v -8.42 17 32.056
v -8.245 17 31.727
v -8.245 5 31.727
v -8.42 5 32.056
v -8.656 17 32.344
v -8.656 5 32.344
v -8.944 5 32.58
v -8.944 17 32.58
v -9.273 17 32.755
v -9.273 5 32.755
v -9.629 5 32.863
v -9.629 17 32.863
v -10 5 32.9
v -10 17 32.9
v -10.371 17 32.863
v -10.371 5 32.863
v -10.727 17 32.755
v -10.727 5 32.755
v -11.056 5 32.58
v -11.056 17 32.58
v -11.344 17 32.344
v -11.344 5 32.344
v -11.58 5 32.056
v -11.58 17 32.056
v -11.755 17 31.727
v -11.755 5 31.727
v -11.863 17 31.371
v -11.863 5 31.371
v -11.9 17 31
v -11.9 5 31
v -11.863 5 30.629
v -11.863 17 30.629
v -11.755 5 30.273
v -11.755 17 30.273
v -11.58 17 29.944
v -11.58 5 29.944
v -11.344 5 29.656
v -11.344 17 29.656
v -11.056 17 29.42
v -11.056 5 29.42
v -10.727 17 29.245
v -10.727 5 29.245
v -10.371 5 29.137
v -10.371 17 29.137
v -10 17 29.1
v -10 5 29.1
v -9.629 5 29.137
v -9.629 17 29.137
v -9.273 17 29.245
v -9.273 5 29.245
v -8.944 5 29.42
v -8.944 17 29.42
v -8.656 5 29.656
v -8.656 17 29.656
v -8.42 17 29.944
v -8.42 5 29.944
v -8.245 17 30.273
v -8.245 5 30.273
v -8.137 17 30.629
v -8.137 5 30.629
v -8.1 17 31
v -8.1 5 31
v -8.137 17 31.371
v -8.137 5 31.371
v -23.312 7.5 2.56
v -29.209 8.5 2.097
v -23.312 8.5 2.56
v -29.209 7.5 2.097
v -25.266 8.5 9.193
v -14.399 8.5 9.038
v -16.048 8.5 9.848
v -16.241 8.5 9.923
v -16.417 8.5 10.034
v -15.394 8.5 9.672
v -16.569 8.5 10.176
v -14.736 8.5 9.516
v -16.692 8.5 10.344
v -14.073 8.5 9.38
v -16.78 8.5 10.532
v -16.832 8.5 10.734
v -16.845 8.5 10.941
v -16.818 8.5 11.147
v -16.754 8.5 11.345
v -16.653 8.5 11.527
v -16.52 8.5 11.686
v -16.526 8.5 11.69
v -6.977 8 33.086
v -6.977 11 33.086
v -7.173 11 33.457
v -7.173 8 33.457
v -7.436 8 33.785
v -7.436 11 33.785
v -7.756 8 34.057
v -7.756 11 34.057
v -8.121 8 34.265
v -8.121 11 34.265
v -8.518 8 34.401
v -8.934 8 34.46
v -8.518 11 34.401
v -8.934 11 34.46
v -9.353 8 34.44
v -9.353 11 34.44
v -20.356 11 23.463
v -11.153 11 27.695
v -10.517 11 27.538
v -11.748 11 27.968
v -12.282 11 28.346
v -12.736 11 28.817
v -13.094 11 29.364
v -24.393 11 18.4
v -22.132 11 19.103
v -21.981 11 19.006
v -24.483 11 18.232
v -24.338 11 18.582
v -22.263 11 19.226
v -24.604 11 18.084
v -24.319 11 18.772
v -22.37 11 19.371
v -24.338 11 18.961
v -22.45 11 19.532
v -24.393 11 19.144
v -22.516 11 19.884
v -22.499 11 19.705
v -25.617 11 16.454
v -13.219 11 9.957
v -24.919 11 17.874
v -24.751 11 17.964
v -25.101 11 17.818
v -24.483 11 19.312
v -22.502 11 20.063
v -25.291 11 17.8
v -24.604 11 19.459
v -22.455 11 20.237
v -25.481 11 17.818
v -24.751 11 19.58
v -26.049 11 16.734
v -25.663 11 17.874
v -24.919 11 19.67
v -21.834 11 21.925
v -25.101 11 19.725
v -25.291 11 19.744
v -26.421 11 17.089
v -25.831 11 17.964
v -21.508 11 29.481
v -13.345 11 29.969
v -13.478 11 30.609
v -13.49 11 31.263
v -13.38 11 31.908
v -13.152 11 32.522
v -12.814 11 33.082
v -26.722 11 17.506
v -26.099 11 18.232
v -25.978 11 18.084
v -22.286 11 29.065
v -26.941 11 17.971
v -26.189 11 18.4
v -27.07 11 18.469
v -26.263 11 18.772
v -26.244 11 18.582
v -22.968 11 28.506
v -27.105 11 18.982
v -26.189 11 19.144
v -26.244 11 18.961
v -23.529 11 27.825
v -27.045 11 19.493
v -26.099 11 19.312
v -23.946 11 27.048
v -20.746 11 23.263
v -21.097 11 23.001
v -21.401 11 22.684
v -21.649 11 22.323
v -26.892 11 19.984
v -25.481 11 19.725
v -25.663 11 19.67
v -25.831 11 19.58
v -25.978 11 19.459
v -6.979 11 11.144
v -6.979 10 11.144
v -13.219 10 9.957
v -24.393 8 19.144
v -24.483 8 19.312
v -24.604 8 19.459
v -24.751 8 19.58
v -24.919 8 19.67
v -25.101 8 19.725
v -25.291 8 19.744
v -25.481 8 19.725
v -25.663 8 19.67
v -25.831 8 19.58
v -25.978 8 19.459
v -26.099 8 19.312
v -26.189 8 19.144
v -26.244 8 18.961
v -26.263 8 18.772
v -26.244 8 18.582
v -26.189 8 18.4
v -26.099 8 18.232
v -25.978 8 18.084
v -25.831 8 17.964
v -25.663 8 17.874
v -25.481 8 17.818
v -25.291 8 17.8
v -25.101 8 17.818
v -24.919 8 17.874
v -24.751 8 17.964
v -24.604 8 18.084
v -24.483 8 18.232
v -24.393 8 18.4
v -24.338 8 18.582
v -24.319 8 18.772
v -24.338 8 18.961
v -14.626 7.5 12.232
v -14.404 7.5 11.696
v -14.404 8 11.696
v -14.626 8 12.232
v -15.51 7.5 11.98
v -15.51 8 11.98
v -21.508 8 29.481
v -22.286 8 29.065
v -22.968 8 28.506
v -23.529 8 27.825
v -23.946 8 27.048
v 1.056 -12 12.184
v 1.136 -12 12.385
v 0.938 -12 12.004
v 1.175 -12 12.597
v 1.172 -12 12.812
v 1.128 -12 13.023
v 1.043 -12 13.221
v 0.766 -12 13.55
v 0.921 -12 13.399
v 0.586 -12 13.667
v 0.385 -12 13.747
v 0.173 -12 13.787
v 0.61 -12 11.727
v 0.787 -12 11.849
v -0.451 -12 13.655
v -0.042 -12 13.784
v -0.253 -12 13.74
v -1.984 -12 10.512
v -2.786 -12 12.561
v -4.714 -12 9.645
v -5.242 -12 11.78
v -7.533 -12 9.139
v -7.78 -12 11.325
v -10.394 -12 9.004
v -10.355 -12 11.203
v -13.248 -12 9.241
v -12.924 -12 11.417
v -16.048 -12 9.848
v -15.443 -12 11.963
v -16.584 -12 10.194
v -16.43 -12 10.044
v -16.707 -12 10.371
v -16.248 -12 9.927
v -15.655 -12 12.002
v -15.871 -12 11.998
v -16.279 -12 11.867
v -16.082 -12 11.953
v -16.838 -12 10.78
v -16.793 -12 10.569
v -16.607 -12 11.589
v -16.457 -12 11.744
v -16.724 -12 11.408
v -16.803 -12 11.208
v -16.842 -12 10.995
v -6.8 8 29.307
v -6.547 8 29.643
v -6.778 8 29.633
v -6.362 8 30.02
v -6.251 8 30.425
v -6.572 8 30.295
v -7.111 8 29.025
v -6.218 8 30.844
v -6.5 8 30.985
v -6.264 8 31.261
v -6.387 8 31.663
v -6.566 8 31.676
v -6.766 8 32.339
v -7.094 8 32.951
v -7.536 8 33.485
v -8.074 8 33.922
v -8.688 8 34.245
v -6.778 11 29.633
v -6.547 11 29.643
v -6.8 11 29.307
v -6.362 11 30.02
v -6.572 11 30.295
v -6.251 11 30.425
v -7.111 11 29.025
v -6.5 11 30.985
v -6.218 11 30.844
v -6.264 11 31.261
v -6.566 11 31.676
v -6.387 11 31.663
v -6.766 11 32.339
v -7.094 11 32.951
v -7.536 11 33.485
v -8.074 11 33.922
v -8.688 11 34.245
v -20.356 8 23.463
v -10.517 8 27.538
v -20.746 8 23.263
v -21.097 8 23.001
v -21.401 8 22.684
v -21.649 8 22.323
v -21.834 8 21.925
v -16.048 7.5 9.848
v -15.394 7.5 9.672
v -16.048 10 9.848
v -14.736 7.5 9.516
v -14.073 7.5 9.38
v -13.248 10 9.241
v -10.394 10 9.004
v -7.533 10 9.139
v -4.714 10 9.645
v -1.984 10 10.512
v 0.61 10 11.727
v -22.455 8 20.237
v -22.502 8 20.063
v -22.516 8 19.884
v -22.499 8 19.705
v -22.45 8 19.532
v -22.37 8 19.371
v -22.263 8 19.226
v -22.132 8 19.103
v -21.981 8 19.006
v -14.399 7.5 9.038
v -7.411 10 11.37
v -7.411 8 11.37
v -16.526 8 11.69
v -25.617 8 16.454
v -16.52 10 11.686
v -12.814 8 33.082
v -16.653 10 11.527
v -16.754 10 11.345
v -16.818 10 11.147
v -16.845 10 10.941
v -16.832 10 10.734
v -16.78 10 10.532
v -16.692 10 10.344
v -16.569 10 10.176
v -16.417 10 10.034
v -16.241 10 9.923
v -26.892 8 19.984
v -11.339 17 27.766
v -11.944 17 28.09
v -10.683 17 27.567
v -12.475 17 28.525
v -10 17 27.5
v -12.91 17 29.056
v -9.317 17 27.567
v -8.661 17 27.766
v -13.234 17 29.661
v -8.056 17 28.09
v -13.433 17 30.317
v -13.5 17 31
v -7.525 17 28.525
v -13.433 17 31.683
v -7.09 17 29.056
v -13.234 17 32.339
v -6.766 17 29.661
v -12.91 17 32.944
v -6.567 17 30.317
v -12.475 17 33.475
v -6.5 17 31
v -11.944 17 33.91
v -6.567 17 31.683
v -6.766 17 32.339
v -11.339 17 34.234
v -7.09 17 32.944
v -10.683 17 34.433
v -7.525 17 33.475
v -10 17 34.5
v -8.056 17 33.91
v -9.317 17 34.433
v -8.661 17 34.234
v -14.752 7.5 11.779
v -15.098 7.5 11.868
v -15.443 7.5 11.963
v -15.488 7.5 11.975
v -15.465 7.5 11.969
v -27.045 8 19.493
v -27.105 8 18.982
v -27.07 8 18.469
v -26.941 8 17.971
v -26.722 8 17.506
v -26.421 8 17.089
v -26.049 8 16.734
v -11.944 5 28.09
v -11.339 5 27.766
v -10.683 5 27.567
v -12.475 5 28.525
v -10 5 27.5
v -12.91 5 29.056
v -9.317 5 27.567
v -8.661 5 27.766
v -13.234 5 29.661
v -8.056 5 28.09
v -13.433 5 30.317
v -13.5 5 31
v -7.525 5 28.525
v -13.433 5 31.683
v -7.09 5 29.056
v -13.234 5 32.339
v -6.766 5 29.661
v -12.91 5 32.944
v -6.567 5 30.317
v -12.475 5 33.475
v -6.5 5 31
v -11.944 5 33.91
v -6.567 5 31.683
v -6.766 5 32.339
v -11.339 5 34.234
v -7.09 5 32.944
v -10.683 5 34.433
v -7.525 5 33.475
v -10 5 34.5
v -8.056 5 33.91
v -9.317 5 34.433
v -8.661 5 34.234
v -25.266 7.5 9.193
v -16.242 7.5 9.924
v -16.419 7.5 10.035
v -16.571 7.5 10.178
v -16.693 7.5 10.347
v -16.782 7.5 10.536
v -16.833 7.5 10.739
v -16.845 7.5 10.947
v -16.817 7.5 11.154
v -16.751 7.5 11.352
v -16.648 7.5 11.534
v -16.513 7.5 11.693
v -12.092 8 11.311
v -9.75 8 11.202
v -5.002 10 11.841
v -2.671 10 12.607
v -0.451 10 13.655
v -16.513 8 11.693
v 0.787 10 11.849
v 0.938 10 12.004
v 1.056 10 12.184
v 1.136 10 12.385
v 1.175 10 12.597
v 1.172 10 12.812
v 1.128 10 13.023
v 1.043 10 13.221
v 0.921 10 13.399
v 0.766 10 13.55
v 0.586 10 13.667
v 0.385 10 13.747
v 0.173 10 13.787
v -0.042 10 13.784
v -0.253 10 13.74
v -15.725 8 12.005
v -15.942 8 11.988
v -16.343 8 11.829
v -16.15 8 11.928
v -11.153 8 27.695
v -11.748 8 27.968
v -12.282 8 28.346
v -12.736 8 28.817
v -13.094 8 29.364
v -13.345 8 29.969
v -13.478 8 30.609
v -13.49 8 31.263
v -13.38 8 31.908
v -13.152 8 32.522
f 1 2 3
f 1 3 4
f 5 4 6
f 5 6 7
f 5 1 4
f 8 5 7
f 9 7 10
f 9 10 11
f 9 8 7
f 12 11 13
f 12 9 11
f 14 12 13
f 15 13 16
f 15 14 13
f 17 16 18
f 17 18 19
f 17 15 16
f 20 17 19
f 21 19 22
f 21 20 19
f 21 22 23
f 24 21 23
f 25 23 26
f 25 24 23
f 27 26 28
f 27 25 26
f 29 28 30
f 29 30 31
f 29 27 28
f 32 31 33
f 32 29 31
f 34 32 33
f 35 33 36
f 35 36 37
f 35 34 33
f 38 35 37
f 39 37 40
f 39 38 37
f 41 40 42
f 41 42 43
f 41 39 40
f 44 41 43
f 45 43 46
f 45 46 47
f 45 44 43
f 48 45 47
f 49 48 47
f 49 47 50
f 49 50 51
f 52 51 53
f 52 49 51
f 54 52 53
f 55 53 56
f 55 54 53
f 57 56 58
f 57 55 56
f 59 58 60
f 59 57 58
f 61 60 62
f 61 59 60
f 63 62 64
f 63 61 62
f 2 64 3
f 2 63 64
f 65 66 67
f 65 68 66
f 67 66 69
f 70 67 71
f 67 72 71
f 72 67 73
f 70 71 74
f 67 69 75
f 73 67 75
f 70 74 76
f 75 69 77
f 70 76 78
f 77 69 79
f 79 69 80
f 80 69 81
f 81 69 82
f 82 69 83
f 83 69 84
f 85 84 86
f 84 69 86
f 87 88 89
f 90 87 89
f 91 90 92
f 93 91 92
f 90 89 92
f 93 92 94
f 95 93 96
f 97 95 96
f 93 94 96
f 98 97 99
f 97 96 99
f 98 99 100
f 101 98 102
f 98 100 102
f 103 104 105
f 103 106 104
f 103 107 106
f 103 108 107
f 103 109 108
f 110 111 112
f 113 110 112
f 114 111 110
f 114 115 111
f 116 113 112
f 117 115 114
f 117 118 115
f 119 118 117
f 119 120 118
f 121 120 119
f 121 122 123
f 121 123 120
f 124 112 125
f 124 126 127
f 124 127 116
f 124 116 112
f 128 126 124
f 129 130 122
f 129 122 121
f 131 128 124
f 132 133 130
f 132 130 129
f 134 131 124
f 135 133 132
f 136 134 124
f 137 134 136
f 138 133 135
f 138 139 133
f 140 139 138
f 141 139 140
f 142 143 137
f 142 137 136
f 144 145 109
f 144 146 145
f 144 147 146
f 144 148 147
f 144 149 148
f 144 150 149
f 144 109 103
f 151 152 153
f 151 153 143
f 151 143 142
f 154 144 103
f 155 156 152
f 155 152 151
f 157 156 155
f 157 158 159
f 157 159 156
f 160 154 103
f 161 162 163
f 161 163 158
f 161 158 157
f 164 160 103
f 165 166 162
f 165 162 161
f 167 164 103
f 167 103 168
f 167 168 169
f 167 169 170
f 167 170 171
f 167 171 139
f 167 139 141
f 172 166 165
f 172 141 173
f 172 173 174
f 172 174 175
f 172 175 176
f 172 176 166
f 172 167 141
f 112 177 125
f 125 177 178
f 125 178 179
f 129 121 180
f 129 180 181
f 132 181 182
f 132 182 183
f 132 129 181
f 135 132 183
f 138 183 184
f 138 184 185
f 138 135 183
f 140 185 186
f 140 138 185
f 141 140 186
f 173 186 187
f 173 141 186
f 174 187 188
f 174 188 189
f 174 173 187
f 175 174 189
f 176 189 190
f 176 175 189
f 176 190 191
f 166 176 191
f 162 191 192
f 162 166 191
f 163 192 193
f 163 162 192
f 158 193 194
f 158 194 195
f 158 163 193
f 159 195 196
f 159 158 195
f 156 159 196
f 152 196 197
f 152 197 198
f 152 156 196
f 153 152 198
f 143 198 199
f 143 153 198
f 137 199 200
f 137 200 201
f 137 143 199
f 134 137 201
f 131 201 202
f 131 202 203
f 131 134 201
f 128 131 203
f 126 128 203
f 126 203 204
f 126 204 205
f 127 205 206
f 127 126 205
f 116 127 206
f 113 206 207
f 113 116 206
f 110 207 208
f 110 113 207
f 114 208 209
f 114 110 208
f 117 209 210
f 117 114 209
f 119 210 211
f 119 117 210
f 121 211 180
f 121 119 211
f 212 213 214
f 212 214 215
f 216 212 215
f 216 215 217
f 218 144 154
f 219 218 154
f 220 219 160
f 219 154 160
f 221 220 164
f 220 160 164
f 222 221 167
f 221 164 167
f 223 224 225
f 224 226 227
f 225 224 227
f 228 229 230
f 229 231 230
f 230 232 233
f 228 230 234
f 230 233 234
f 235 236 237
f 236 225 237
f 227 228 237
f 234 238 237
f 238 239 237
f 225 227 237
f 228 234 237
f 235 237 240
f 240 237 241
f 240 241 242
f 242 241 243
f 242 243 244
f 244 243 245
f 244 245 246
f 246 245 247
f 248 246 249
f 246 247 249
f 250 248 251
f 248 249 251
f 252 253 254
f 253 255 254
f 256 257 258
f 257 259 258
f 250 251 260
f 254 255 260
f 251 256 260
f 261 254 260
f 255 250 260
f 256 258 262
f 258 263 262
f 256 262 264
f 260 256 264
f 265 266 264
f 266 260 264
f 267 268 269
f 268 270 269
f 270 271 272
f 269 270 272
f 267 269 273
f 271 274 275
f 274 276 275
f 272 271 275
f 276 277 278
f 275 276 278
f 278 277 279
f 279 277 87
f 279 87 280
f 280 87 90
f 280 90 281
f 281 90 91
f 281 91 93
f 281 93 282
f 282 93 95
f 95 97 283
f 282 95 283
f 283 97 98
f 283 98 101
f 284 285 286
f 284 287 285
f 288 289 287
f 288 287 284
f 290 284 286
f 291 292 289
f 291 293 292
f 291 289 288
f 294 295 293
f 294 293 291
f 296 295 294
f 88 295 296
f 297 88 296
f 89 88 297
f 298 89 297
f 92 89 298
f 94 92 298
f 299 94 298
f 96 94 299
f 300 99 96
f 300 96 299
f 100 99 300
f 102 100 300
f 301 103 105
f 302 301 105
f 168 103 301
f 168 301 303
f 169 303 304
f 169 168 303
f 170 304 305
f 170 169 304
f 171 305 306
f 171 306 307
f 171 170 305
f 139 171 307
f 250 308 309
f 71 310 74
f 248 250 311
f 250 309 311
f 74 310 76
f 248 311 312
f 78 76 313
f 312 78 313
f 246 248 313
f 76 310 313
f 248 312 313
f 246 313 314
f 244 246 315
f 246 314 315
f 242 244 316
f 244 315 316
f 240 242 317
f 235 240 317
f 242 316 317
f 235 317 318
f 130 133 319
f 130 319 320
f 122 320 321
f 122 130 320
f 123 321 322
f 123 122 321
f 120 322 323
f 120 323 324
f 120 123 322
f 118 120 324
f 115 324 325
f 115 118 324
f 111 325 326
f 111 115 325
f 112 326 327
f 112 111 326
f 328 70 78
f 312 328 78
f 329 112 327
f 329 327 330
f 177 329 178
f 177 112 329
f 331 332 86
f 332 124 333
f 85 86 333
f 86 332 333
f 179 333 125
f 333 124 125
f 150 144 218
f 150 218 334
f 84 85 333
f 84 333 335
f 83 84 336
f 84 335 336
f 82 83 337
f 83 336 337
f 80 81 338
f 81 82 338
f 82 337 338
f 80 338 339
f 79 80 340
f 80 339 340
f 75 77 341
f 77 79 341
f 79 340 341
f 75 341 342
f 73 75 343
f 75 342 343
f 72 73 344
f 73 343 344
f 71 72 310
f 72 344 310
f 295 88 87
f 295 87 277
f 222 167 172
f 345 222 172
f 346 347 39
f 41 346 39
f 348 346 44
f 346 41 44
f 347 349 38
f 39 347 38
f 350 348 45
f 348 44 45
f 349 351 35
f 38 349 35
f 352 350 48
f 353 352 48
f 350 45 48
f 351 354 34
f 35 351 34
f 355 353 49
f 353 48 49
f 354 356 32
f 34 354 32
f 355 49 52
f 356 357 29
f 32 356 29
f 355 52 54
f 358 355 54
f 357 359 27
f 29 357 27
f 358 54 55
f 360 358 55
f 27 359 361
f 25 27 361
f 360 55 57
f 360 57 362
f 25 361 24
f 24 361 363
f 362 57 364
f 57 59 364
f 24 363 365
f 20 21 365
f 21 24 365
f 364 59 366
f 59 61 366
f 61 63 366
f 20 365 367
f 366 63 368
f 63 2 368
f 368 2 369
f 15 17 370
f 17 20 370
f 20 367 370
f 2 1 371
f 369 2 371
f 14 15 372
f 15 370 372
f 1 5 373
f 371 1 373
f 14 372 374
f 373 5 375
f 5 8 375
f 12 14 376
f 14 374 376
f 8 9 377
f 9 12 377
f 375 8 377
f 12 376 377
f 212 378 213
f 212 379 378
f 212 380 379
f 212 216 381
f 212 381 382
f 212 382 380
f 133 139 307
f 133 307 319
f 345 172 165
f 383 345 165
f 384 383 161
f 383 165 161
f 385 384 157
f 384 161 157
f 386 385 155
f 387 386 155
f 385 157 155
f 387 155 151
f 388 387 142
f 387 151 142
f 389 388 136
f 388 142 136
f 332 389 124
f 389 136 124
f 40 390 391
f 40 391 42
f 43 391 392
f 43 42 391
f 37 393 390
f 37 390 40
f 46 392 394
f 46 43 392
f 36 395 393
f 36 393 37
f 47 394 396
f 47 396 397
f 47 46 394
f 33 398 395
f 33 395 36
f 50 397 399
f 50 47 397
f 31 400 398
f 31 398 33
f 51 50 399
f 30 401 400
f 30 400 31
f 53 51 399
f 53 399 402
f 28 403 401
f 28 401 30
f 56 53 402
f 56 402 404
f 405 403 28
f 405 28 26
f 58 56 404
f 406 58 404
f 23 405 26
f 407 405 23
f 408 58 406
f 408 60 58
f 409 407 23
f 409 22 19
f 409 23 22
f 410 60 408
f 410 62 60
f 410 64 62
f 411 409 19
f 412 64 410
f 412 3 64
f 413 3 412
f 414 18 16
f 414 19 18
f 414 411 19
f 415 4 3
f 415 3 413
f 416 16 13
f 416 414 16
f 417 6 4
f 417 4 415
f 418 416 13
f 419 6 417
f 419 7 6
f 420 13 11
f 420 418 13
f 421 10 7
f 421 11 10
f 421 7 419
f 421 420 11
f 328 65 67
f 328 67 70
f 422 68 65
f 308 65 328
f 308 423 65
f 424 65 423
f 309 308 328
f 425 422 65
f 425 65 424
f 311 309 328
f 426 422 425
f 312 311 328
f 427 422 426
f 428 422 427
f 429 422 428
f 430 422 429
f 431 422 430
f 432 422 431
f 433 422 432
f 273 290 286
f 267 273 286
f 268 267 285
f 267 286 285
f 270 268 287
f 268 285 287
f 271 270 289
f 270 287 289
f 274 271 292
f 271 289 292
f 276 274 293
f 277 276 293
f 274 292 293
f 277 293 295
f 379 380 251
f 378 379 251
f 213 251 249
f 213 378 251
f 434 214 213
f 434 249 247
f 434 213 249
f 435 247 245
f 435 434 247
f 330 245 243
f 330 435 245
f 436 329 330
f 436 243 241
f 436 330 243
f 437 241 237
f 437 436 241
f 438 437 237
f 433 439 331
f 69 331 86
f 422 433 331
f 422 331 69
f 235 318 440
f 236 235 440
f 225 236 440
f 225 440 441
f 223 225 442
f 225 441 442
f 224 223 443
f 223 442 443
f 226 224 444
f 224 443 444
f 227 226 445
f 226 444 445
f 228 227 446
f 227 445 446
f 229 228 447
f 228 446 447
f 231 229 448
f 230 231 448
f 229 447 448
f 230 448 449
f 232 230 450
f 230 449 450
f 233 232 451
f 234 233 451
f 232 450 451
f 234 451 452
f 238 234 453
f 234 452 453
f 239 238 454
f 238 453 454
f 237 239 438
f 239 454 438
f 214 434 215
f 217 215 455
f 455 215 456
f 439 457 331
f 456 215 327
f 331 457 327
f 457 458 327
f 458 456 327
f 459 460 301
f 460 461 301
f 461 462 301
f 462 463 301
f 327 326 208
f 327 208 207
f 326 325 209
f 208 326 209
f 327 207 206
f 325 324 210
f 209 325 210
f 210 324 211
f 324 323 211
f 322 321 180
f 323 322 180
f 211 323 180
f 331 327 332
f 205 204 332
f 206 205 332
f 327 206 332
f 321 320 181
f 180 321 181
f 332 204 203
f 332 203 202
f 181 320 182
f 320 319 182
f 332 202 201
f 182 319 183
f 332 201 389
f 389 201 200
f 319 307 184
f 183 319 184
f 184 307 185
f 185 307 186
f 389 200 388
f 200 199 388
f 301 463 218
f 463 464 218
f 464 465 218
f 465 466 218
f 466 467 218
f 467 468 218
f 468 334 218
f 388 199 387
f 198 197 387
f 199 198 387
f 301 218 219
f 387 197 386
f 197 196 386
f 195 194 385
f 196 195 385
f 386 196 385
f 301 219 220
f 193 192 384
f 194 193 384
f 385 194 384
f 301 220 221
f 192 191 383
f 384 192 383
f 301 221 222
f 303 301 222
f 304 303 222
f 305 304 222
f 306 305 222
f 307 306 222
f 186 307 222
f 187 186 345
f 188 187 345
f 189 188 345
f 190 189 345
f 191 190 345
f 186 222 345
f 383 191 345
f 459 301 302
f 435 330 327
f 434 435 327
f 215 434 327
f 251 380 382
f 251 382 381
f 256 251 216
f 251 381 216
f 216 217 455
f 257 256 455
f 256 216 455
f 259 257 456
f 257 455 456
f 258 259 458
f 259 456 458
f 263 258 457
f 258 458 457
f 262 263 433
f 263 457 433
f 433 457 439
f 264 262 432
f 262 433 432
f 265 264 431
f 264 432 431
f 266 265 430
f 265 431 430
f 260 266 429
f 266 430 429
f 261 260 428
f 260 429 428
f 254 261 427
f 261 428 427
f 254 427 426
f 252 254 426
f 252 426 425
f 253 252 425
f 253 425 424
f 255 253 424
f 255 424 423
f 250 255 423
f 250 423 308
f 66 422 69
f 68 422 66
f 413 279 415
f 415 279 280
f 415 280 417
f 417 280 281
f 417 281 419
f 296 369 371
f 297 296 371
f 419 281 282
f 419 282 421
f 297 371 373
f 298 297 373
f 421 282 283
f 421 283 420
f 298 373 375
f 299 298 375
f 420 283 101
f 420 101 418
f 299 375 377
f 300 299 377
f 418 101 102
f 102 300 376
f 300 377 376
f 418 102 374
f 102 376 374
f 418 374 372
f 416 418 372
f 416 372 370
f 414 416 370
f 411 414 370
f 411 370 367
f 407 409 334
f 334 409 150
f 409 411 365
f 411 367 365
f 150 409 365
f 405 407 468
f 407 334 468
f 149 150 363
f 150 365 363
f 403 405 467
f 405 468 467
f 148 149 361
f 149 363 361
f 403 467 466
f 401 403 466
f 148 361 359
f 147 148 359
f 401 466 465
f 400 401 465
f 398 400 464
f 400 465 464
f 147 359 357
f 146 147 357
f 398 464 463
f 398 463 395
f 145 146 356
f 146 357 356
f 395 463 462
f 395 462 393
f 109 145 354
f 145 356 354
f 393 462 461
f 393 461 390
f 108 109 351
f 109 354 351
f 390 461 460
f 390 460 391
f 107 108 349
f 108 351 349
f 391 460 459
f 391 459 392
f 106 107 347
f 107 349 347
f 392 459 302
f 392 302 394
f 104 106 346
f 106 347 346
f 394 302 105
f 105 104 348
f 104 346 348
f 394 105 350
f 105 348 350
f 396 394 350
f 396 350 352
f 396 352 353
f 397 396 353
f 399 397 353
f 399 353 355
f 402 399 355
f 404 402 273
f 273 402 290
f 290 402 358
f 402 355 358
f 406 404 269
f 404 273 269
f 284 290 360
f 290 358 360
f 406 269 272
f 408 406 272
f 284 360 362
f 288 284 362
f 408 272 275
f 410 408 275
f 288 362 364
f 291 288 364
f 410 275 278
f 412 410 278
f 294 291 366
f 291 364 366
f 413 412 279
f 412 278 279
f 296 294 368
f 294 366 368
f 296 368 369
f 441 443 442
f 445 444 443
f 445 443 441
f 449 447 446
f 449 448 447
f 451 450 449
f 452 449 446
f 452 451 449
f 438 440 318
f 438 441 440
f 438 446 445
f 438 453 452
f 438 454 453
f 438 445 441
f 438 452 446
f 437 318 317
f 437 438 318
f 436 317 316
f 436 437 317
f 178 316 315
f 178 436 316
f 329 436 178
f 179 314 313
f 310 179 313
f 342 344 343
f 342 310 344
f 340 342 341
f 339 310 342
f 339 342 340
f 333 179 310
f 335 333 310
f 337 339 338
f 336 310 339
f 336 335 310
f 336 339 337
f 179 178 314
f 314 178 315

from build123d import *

# Parameters (mm, degrees)
SKETCH024_R             = 3.5
SKETCH024_R_2           = 1.9
PAD012_DEPTH            = 12
SKETCH025_R             = 2
SKETCH025_R_2           = 0.972006
PAD013_DEPTH            = 3
PAD014_DEPTH            = 22
PAD015_DEPTH            = 0.5
BODY006_PLACEMENT_ANGLE = 22.5


with BuildPart() as part:
    # Sketch024 → Pad012 (new body)
    with BuildSketch(Plane.XZ.offset(-7)):
        Circle(SKETCH024_R)
        Circle(SKETCH024_R_2, mode=Mode.SUBTRACT)
    extrude(amount=PAD012_DEPTH)

    # Sketch025 → Pad013 (join)
    with BuildSketch(Plane.XZ.offset(-1)):
        with BuildLine():
            Line((3.591196, 0.770117), (3.591196, -0.770117))
            ThreePointArc((1.361313, -3), (2.938078, -2.346882), (3.591196, -0.770117))
            Line((-12.451851, -3), (1.361313, -3))
            ThreePointArc((-12.451851, -3), (-13.518451, -3.22331), (-14.40589, -3.855731))
            Line((-14.40589, -3.855731), (-15.625704, -5.177633))
            ThreePointArc((-15.625704, -5.177633), (-15.890477, -5.83085), (-15.658609, -6.496457))
            Line((-15.658609, -6.496457), (-4.807646, -19.501059))
            Line((-4.807646, -19.501059), (-11.027147, -18.20942))
            Line((-19.99501, -7.462236), (-11.027147, -18.20942))
            ThreePointArc((-19.821704, -3.713124), (-20.637136, -5.553991), (-19.99501, -7.462236))
            Line((-14.397367, 1.685472), (-19.821704, -3.713124))
            ThreePointArc((-11.21311, 3), (-12.93557, 2.658446), (-14.397367, 1.685472))
            Line((-11.21311, 3), (-4.42391, 3))
            Line((-4.42391, 3), (1.361313, 3))
            ThreePointArc((3.591196, 0.770117), (2.938078, 2.346882), (1.361313, 3))
        make_face()
        Circle(SKETCH025_R, mode=Mode.SUBTRACT)
        with Locations((-18.806547, -5.445875)):
            Circle(SKETCH025_R_2, mode=Mode.SUBTRACT)
    extrude(amount=PAD013_DEPTH)

    # Sketch026 → Pad014 (join)
    with BuildSketch(Plane.XZ):
        with BuildLine():
            ThreePointArc((-12.313913, -15.505081), (-5.478083, -19.027102), (2.184032, -19.679177))
            ThreePointArc((2.426703, -21.865752), (3.398655, -20.651129), (2.184032, -19.679177))
            ThreePointArc((-13.682126, -17.227868), (-6.086758, -21.141224), (2.426703, -21.865752))
            ThreePointArc((-12.313913, -15.505081), (-13.859413, -15.682368), (-13.682126, -17.227868))
        make_face()
    extrude(amount=PAD014_DEPTH)

    # Sketch027 → Pad015 (join, symmetric)
    with BuildSketch(Plane.XZ.offset(2)):
        Polygon((-28.80796, -19.352043), (-23.182241, -21.180655), (-12.468725, -18.606313), (-11.456409, -18.159056), (-11.456409, -15.568812), (-22.449142, -14.305279), align=None)
    extrude(amount=PAD015_DEPTH, both=True)


with BuildPart() as part_1:
    # Body006 placement: moved
    add(part.part.moved(Location((-10, 10, 31))).rotate(Axis((-10, 10, 31), (0, -1, 0)), BODY006_PLACEMENT_ANGLE))


solid = part_1.part
